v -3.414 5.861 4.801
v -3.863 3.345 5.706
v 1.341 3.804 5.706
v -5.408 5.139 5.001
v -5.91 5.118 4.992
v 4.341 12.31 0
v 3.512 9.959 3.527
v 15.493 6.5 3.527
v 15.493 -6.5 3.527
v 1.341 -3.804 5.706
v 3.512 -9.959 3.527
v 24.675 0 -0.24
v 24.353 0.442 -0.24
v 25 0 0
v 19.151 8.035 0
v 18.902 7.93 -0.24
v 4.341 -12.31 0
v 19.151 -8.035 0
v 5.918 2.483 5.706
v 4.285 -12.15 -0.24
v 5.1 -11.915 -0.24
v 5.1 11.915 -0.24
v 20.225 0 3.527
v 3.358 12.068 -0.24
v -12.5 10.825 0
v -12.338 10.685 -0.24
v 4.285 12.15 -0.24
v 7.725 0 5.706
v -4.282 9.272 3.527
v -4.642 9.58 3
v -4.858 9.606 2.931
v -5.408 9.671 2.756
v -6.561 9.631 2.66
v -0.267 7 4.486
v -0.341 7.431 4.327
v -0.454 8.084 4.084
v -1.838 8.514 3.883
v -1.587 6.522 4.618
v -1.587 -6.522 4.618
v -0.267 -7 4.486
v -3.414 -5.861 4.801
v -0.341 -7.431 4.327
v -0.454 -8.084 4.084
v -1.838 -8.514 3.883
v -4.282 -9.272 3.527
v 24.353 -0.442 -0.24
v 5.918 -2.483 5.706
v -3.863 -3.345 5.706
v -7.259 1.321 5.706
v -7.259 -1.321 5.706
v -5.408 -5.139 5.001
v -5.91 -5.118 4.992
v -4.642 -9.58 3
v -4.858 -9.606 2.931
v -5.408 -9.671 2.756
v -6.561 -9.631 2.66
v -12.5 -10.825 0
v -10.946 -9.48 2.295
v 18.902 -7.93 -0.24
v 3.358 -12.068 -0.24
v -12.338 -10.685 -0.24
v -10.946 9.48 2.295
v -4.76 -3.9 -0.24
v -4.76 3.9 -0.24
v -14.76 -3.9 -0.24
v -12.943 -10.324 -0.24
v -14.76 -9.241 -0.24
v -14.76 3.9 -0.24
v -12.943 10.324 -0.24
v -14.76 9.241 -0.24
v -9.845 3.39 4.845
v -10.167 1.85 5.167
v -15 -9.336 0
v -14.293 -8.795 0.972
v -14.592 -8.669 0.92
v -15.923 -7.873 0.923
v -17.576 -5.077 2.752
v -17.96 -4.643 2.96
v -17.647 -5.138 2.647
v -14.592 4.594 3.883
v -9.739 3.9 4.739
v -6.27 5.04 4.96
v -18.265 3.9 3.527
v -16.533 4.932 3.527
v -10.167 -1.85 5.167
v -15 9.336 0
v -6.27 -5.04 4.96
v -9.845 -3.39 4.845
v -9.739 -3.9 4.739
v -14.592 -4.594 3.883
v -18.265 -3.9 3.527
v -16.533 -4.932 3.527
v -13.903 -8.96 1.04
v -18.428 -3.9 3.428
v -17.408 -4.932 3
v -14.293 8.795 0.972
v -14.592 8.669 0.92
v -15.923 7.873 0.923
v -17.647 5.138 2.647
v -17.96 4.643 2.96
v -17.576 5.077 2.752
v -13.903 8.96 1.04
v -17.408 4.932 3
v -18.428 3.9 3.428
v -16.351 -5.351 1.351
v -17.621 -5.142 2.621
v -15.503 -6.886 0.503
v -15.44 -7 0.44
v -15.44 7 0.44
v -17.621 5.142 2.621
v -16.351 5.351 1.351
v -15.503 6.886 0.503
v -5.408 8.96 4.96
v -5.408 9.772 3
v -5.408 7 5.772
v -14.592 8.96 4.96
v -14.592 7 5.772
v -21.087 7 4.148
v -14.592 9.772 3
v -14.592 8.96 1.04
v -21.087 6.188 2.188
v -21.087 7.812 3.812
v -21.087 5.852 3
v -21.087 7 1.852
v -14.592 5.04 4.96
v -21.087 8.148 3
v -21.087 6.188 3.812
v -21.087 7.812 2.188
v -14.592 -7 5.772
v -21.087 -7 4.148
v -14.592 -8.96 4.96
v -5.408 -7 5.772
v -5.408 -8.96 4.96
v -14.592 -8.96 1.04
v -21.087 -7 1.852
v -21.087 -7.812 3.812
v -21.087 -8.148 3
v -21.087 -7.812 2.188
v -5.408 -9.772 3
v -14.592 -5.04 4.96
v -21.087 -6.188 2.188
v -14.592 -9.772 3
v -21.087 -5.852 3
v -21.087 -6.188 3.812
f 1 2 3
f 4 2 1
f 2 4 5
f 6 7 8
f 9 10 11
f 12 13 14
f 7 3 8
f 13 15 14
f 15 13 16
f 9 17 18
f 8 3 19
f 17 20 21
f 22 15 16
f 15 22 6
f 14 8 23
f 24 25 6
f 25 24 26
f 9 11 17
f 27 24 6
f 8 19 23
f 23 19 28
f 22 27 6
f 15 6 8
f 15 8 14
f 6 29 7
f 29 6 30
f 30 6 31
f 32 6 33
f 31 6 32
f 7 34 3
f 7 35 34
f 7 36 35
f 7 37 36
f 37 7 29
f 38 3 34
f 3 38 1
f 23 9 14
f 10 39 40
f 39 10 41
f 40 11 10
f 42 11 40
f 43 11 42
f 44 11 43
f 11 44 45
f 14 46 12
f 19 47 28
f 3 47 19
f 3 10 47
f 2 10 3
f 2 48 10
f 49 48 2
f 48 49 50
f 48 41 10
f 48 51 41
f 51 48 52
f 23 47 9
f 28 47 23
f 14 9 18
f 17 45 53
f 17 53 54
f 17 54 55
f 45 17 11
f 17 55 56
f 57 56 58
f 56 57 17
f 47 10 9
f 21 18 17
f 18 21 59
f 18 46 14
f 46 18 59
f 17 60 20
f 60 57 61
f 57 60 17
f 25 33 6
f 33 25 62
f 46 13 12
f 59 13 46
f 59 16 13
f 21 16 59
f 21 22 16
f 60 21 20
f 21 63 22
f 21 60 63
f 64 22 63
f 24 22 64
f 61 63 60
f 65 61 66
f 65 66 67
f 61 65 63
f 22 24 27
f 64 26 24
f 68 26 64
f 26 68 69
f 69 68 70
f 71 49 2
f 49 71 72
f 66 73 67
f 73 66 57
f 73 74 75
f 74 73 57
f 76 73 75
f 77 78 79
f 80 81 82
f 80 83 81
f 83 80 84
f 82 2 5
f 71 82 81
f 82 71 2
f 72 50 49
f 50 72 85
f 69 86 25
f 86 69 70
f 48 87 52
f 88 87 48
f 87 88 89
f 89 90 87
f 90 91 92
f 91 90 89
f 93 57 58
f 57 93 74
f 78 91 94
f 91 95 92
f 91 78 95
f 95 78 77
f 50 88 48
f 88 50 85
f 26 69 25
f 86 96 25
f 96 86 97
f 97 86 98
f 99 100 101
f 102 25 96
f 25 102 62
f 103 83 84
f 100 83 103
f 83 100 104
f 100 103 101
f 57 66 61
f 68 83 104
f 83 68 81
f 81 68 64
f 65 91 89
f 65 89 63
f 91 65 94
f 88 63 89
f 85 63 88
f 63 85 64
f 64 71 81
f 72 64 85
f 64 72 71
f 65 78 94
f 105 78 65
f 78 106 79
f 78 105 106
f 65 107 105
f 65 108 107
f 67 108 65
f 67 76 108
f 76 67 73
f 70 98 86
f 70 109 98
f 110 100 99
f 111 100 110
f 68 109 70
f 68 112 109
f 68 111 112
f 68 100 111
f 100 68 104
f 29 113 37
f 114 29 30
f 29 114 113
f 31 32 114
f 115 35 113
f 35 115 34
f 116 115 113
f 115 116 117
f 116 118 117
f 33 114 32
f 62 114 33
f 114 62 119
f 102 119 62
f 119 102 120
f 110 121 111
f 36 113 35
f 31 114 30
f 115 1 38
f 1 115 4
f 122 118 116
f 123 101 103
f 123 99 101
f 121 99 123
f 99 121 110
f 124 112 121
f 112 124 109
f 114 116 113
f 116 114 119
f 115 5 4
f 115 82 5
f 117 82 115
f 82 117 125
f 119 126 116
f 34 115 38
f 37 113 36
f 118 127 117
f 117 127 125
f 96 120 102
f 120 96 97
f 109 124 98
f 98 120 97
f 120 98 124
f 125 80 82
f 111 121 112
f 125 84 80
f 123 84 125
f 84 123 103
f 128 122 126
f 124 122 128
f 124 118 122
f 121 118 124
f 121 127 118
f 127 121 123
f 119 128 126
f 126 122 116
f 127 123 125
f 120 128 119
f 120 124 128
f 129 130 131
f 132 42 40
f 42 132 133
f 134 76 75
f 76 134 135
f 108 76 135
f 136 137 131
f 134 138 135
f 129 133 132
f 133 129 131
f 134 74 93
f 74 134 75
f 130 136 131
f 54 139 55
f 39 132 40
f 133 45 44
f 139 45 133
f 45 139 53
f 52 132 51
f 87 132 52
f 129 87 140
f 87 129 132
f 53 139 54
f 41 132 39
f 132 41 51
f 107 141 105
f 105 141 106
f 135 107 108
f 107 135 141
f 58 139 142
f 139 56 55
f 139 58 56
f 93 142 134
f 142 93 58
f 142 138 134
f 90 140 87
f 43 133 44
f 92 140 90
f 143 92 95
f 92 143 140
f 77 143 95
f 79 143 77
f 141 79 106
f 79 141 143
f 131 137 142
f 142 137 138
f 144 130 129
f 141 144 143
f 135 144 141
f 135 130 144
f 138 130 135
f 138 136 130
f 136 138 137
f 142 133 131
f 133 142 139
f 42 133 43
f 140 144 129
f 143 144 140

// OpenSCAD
// file: ../lib/util.scad
fn1 = 32;
fn2 = 16;

module util_half_sphere(radius, fn=fn1) {
    difference() {
        sphere(radius, $fn=fn);
        translate([0,0,-(radius+radius/19)])
            cube(2*radius+radius/10, center=true);
    }
}

function gcd(a,b) = a == b ? a : a > b ? gcd(a-b, b) : gcd(a, b-a);

module util_saucer(length, width, height, fn=fn1) {
    rad = gcd(length,gcd(width,height));
    //rad = 10;
    scale([length/(2*rad), width/(2*rad), height/rad])
        util_half_sphere(rad, fn);
}

module util_half_cylinder(length, radius, inner_fn=fn2, outer_fn=fn1) {
    maxval = max(length, 2*radius);
    intersection() {
        difference() {
            rotate([0,90,0])
                translate([0,0,-(length/2 + length/20)])
                    cylinder(length+length/10, radius, radius, $fn=inner_fn);
            
            translate([0,0,(maxval/2 + maxval/19)])
                cube(maxval+maxval/10, center=true);
        }
        
        translate([0,0,-(radius+radius/20)])
            cylinder(radius + radius/10, length/2, length/2, $fn=outer_fn);
    }
}

module util_body(length, width, height, upper_height, fn=fn1) {
    rad = gcd(length, gcd(width, upper_height));
    
    scale(.995) scale([length/(2*rad), width/(2*rad), 1])
        util_half_cylinder(2*rad, height, outer_fn=fn);
}

module util_graded_cylinder(height, radius_start, radius_end, grades=1, fn=fn1) {
    height_grade = height / grades;
    radius_grade = (radius_start - radius_end) / (grades * grades);
    for (i = [0 : 1 : grades]) {
        translate([0,0,i*height_grade])
            cylinder(height_grade, 
                     radius_start - i*radius_grade * i,
                     radius_start - (i+1) * radius_grade * (i+1),
                     $fn = fn);
    }
}

module util_nacelle(length, width, height, curved=false, up=true, front_bulge=false) {
    rad = min(width, height/2);
    grads = curved ? 6 : 1;
    scale_factor = front_bulge ? 1.1 : 1;
    direction = up ? -1 : 1;
    difference() {
        scale([1, width/ (2*rad), height/rad])
            difference() {
                union() {
                    rotate([0,-90,0])
                        rotate(30)
                            util_graded_cylinder(length-rad, rad, rad/2, grads, 6);
                    scale(scale_factor) 
                        rotate([0,90,0]) rotate(90) sphere(rad, $fn=6);
                }
                
                translate([-length/2, 0, direction * (height/2 + height/19)])
                    cube([length+length, width+width, height+height/10], center=true);
            }
        
        translate([-length-(curved?length/3:0), 0, -length/3])
            rotate([0,-45,0])
                cube(length, center=true);
    }
}

module util_mirrored(v) {
    children();
    mirror(v) children();
}

module util_ring(outer, inner, height, fn=fn1) {
    difference() {
        translate([0,0,-height/2])
            cylinder(height, outer, outer, $fn=fn);
        translate([0,0,-(height/2 + height/19)])
            cylinder(height+height/10, inner, inner, $fn=fn);
    }
}

module util_star(radius, thick, num, half=false) {
    angle = 360/num;
    offset = half? angle/2 : 0;
    for (i = [0: 1: num]) {
        rotate(i* angle + offset)
            translate([radius/2,0,0])
                cube([radius, thick, thick], center=true);
    }
}

module util_ring_star(radius, thick, num, inner, half=false) {
    outer=inner+thick;
    avg = (inner + outer)/2;
    union() {
        difference() {
            util_star(radius, thick, num, half);
            cylinder(2*thick, outer, outer, $fn=num, center=true);
        }
        util_ring(outer, inner, thick);
    }
}

module util_hangar_disk(height, lower, upper, num, fn=fn1) {
    difference() {
            cylinder(height, lower, upper, $fn=fn, center=true);
        difference() {
            scale([1,1,22])
                util_star(1.1*upper, height/20, num, half=true);
            scale(.95)
                cylinder(height, lower, upper, $fn=fn, center=true);
        }
    }
}

module util_hangar_form(length, width, height, num, inner=0) {
    l = 0.6* max(length, width);
    h = 2.5* height;
    thick = min(height/20,1);
    inner = inner == 0 ? l/3 : inner;
    difference() {
        children();
        scale([1,1,h/thick]) 
            util_ring_star(l, thick, num, inner, half=true);
    }
    scale(.95) children();
}

module util_nacelle_bar(span, height, width, thickness, faces=fn1) {
    rad = (span*span/(8*height) + height/2);
    outer = rad + thickness/2;
    inner = rad - thickness/2;
    difference(){
        translate([0,0,outer])
            rotate([0,90,0])
                util_ring(outer, inner, width, fn=faces);
    
        translate([0,0,1.1*outer+height])
            cube(2.2*outer, center=true);
    }
}

module util_q_sphere(rad, quadrant, faces) {
    x_sign = quadrant == 1 ? 1 :
             quadrant == 2 ? -1 :
             quadrant == 3 ? -1 :
             quadrant == 4 ? 1 : 0;
    z_sign = quadrant == 1 ? 1 :
             quadrant == 2 ? 1 :
             quadrant == 3 ? -1 :
             quadrant == 4 ? -1 : 0;
    
    difference() {
        sphere(rad, $fn=faces);

        translate([x_sign*(-1.1*rad - .01),0,0])
        cube(2.2*rad, center=true);

        translate([0,0,z_sign*(-1.1*rad - .01)])
        cube(2.2*rad, center=true);
    }
}

module util_ovoid(front_rad, back_rad, width, upper_rad, lower_rad, faces=32) {
    half_width = width/2;
    largest=max(front_rad, back_rad, half_width, upper_rad, lower_rad);
    smallest=min(front_rad, back_rad, half_width, upper_rad, lower_rad);
    
    union() {
        scale([front_rad/smallest, half_width/smallest, upper_rad/smallest])
        util_q_sphere(smallest, 1, faces);
        
        scale([front_rad/smallest, half_width/smallest, lower_rad/smallest])
        util_q_sphere(smallest, 4, faces);
        
        scale([back_rad/smallest, half_width/smallest, lower_rad/smallest])
        util_q_sphere(smallest, 3, faces);
        
        scale([back_rad/smallest, half_width/smallest, upper_rad/smallest])
        util_q_sphere(smallest, 2, faces);
    }
}

module util_saucer_shape(width, height, height_ext, depth, depth_ext) {
    difference() {
        util_ovoid(width/2,
                   width/2,
                   width,
                   height+height_ext,
                   depth+depth_ext);
        
        if (height_ext > 0) {
            translate([0,0,width/2 + height])
            cube(width, center=true);
        }
        
        if (depth_ext > 0) {
            translate([0,0,-width/2 - depth])
            cube(width, center=true);
        }
    }
}
// main file
use <../lib/util.scad>;

module attack_primary() {
    difference() {
        util_ovoid(25,25,25,6,.25,faces=9);

        translate([-5,0,0])
        rotate([0,-45,0])
        translate([-50,0,0])
        cube([100,7.8,100], center=true);
        
        translate([-15,0,0])
        rotate([0,-45,0])
        translate([-50,0,0])
        cube(100, center=true);
    }


    util_mirrored([0,1,0])
    translate([-10,7,3])
    scale([24,6,6])
    rotate([0,90,0])
    sphere(d=1, $fn=8);
}

attack_primary();
